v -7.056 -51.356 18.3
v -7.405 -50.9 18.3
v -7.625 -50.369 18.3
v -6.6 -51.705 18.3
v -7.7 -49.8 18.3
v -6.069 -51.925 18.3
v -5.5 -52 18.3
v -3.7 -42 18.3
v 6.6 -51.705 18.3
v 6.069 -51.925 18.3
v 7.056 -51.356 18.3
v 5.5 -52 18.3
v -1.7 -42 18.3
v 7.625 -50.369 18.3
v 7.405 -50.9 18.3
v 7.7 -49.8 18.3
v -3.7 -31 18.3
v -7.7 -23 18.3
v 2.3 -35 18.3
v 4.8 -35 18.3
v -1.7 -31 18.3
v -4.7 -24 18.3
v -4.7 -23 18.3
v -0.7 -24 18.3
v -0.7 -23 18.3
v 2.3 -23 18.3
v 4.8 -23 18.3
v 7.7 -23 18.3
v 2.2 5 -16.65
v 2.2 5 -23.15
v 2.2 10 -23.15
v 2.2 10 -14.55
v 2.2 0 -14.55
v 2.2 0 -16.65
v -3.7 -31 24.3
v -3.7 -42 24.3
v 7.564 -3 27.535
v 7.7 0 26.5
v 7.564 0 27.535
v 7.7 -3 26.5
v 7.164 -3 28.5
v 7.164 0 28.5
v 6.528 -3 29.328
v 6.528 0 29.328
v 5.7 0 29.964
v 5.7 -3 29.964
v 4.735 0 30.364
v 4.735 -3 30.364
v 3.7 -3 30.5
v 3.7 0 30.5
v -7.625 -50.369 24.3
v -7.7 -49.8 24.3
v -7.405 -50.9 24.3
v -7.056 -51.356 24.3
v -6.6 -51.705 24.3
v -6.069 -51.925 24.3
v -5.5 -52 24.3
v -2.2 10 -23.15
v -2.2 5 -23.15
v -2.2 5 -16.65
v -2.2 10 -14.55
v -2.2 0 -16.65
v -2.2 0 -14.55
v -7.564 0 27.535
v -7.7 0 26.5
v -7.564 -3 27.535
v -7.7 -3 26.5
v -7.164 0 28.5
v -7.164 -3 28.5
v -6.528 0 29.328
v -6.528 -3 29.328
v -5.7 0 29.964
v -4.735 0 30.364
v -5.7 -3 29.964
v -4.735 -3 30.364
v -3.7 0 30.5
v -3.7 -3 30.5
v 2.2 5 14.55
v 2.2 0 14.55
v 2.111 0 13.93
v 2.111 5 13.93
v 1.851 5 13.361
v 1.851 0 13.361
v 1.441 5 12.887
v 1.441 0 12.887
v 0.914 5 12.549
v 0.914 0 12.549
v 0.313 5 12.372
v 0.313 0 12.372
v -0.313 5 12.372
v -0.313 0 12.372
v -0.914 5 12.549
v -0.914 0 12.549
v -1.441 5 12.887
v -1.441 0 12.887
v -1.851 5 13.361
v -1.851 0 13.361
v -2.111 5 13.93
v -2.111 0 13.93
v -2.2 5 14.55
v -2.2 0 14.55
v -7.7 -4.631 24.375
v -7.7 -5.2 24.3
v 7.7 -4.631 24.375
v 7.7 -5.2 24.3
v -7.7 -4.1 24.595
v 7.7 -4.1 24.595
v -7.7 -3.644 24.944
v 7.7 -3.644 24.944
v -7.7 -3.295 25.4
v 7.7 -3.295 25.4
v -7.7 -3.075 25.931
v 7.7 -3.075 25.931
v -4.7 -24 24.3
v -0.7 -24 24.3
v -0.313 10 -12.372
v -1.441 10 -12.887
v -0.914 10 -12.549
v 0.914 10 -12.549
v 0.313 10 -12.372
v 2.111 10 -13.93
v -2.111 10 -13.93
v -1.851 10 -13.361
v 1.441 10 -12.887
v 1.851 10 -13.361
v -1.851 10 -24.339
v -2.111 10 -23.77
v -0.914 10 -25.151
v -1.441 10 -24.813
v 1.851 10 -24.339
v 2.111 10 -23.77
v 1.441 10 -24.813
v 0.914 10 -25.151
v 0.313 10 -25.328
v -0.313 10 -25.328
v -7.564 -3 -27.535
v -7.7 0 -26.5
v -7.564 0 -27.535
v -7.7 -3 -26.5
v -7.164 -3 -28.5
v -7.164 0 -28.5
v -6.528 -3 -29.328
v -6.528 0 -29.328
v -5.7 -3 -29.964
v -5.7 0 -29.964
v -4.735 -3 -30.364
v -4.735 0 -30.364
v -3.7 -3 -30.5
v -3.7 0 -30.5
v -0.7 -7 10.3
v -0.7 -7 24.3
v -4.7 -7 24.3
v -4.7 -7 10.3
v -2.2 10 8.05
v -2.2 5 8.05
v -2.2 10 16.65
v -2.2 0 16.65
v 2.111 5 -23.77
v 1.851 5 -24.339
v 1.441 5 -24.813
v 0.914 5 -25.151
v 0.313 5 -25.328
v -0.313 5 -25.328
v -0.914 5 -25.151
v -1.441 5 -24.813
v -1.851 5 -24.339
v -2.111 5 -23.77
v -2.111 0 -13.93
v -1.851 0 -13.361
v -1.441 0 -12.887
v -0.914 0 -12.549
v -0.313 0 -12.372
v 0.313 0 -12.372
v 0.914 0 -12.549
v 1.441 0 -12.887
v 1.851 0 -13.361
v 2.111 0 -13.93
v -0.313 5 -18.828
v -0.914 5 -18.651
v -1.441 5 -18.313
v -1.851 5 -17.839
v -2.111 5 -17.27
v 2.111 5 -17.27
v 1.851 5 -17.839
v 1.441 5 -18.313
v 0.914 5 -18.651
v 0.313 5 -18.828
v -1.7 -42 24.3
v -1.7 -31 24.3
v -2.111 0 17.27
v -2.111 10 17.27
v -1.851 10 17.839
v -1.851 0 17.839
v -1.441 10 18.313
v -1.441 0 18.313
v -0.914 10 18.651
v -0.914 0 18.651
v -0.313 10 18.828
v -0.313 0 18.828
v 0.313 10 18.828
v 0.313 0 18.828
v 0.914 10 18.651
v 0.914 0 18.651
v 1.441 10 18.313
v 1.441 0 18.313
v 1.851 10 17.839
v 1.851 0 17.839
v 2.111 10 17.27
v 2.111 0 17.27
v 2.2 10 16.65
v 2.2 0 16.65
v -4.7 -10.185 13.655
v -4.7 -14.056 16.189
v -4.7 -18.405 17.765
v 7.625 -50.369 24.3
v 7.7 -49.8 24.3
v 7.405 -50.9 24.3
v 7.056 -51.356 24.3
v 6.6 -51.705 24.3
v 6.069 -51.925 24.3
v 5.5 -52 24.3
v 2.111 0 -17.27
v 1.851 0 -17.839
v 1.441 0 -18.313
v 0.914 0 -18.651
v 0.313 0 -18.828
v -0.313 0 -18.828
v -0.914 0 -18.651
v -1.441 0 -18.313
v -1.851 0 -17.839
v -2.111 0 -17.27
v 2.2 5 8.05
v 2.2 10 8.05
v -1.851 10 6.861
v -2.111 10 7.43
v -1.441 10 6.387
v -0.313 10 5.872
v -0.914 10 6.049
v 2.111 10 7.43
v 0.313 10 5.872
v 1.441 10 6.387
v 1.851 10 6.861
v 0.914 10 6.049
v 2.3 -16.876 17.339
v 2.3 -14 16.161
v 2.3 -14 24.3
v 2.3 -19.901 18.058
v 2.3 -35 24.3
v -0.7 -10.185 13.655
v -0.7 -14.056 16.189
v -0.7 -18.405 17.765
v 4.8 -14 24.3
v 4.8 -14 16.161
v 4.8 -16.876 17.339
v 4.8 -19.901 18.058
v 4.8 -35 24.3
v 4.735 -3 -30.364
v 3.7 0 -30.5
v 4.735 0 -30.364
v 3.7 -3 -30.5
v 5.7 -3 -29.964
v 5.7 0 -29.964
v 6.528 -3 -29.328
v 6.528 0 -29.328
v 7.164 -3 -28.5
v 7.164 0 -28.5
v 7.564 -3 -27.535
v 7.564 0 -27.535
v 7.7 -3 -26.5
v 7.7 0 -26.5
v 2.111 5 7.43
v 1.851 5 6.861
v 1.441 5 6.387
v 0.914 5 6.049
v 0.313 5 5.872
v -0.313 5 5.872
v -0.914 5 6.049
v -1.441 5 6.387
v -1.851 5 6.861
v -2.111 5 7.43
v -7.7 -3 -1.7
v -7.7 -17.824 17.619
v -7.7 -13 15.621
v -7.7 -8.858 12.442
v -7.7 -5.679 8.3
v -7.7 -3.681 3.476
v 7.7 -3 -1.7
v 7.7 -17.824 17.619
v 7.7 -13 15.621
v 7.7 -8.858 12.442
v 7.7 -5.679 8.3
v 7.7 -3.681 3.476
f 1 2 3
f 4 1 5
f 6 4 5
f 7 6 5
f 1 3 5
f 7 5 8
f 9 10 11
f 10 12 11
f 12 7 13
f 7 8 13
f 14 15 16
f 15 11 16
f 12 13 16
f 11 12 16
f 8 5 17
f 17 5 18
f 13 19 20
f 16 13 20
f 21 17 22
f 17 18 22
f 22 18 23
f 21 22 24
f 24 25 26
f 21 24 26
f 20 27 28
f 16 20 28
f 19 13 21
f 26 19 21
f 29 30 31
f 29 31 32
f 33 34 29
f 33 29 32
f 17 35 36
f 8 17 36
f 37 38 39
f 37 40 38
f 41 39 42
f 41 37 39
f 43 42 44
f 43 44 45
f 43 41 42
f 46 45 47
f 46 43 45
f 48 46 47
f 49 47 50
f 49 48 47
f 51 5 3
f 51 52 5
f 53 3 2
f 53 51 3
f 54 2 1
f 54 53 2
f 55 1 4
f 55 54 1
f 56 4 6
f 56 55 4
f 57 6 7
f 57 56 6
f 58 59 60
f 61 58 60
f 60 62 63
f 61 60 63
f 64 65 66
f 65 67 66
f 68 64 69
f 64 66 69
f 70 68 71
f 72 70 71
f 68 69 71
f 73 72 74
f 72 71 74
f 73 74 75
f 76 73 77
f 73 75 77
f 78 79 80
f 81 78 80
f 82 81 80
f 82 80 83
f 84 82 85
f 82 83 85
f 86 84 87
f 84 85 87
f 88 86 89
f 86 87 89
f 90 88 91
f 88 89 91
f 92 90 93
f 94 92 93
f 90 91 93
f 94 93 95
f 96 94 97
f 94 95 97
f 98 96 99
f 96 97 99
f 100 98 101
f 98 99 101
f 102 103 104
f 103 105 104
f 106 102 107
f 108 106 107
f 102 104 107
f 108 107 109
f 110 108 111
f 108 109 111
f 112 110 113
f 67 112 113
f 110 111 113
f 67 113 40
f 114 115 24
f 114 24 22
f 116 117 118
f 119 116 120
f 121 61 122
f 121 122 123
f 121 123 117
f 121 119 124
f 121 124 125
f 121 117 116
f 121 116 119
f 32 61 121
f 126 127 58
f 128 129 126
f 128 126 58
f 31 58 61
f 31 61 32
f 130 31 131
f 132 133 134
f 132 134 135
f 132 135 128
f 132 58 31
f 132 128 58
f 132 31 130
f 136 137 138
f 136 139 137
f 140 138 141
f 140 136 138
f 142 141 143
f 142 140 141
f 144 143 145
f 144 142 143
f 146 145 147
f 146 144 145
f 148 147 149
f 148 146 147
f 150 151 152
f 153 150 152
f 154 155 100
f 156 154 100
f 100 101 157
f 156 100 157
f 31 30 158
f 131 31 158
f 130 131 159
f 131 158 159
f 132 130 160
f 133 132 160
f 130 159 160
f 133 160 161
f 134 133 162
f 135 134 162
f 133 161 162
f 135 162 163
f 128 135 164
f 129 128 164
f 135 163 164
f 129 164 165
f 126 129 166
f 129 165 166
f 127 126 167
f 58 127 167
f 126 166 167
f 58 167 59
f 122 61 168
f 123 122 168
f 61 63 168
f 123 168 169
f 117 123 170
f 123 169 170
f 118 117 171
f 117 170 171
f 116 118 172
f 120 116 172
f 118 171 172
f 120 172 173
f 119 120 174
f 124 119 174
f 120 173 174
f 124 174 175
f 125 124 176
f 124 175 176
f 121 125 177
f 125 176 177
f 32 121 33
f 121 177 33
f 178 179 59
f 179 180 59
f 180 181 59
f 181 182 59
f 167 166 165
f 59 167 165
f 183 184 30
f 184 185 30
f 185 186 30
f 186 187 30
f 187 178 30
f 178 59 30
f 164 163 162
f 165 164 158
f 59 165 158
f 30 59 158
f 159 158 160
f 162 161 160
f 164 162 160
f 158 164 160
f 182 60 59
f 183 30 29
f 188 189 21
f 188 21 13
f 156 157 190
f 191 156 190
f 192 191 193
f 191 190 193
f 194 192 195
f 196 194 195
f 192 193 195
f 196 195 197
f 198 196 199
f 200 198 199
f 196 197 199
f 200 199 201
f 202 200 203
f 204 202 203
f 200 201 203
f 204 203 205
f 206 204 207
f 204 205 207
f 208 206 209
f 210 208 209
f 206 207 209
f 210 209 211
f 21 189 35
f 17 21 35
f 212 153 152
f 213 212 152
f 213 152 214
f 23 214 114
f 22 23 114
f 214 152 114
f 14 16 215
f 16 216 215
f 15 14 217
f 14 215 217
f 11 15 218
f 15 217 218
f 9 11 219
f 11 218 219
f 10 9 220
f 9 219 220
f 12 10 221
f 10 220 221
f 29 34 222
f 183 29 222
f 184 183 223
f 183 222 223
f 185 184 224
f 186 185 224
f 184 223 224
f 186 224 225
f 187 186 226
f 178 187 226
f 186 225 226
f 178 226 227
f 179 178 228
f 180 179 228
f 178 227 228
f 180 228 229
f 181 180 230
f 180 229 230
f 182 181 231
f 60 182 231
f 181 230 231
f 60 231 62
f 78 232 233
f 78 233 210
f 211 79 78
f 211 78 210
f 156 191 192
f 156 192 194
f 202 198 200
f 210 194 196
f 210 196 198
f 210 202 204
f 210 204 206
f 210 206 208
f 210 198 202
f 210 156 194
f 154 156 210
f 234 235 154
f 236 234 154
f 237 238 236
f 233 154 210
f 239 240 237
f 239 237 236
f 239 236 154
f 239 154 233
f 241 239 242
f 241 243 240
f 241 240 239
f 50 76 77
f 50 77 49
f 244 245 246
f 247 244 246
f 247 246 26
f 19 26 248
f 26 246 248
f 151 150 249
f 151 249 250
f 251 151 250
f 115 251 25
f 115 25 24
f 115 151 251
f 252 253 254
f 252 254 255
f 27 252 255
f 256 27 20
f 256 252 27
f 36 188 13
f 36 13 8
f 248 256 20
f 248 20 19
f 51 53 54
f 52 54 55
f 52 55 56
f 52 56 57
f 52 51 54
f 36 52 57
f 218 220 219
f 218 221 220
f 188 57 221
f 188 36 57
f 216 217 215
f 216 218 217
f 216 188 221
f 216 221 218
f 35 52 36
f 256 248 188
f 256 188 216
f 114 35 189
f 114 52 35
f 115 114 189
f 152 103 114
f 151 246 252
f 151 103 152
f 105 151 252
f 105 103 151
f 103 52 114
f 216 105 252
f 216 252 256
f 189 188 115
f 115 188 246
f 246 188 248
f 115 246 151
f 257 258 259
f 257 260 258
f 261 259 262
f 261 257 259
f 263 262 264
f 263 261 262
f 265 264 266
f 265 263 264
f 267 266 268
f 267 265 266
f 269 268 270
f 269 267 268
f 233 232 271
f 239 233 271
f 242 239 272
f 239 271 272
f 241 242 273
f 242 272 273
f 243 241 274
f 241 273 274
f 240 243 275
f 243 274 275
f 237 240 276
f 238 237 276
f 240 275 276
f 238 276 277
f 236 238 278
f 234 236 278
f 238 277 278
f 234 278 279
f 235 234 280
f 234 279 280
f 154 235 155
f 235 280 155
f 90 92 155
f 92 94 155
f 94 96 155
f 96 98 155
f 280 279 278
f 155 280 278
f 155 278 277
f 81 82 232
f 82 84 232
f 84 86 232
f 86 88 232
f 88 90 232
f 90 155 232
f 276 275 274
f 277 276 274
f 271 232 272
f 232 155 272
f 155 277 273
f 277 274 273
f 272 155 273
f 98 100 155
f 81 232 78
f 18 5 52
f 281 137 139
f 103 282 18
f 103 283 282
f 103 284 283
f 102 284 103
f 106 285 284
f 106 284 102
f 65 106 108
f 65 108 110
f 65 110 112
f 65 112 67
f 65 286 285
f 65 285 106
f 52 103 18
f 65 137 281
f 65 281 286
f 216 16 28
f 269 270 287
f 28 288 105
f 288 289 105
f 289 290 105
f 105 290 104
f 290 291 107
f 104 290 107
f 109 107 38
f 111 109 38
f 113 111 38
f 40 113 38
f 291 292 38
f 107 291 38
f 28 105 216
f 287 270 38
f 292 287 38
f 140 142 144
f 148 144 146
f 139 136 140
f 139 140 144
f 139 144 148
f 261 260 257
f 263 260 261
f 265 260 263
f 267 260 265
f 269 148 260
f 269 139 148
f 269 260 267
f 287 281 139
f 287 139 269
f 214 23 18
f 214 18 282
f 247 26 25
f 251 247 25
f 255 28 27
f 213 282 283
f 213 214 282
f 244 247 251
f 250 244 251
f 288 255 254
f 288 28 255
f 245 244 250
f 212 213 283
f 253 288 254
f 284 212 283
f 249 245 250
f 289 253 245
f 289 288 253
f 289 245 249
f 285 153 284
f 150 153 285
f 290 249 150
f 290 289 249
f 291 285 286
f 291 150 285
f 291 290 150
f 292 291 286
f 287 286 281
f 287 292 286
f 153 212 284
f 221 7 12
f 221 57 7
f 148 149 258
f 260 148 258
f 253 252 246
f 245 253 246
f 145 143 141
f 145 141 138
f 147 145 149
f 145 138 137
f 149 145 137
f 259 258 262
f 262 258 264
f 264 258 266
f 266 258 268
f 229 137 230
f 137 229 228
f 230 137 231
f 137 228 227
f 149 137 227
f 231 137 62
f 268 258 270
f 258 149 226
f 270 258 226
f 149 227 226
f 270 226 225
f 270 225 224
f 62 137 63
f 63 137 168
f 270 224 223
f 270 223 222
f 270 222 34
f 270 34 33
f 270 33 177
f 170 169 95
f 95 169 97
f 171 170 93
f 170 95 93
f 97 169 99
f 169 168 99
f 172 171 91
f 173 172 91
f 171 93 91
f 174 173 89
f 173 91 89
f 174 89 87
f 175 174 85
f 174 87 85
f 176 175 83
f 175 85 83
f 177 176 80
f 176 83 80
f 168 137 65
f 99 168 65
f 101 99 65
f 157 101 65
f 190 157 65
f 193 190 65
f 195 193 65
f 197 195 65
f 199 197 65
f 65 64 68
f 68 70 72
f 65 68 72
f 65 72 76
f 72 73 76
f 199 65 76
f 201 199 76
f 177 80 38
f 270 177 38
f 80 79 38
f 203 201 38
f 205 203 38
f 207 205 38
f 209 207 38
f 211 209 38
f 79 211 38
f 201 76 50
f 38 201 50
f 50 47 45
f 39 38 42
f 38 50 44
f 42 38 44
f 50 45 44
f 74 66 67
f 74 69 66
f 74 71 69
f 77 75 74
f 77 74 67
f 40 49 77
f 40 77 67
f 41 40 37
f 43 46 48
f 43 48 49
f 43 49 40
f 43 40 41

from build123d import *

# Parameters (mm, degrees)
SKETCH_W      = 15.4
SKETCH_H      = 61
PAD_DEPTH     = 3
FILLET_R      = 4
PAD001_DEPTH  = 5
PAD002_DEPTH  = 5
SKETCH003_W   = 15.4
SKETCH003_H   = 6
PAD003_DEPTH  = 49
FILLET001_R   = 2.2
FILLET002_R   = 20
FILLET003_R   = 2.2
SKETCH004_W   = 4
SKETCH004_H   = 17
SKETCH004_W_2 = 2
SKETCH004_H_2 = 11
SKETCH004_W_3 = 2.5
SKETCH004_H_3 = 21
POCKET_DEPTH  = 54.801


with BuildPart() as part:
    # Sketch → Pad (new body)
    with BuildSketch(Plane.XZ):
        Rectangle(SKETCH_W, SKETCH_H)
    extrude(amount=PAD_DEPTH)

    # Fillet
    fillet_edges = [part.edges().sort_by_distance(p)[0] for p in [
        (7.7, -1.5, 30.5),
        (-7.7, -1.5, 30.5),
        (7.7, -1.5, -30.5),
        (-7.7, -1.5, -30.5),
    ]]
    fillet(fillet_edges, radius=FILLET_R)

    # Sketch001 (on Face2 of Fillet) → Pad001 (join)
    with BuildSketch(Plane(origin=(0, 0, 0), x_dir=(1, 0, 0), z_dir=(0, 1, 0))):
        with BuildLine():
            Line((-2.2, 16.65), (-2.2, 14.55))
            ThreePointArc((-2.2, 14.55), (0, 12.35), (2.2, 14.55))
            Line((2.2, 16.65), (2.2, 14.55))
            ThreePointArc((2.2, 16.65), (0, 18.85), (-2.2, 16.65))
        make_face()
        with BuildLine():
            Line((-2.2, -14.55), (-2.2, -16.65))
            ThreePointArc((-2.2, -16.65), (0, -18.85), (2.2, -16.65))
            Line((2.2, -14.55), (2.2, -16.65))
            ThreePointArc((2.2, -14.55), (0, -12.35), (-2.2, -14.55))
        make_face()
    extrude(amount=PAD001_DEPTH)

    # Sketch002 (on Face19 of Pad001) → Pad002 (join)
    with BuildSketch(Plane(origin=(0, 5, 0), x_dir=(1, 0, 0), z_dir=(0, 1, 0))):
        with BuildLine():
            Line((-2.2, 23.15), (-2.2, 14.55))
            ThreePointArc((-2.2, 14.55), (0, 12.35), (2.2, 14.55))
            Line((2.2, 23.15), (2.2, 14.55))
            ThreePointArc((2.2, 23.15), (0, 25.35), (-2.2, 23.15))
        make_face()
        with BuildLine():
            Line((-2.2, -8.05), (-2.2, -16.65))
            ThreePointArc((-2.2, -16.65), (0, -18.85), (2.2, -16.65))
            Line((2.2, -8.05), (2.2, -16.65))
            ThreePointArc((2.2, -8.05), (0, -5.85), (-2.2, -8.05))
        make_face()
    extrude(amount=PAD002_DEPTH)

    # Sketch003 (on Face5 of Pad002) → Pad003 (join)
    with BuildSketch(Plane.XZ.offset(3)):
        with Locations((0, 21.3)):
            Rectangle(SKETCH003_W, SKETCH003_H)
    extrude(amount=PAD003_DEPTH)

    # Fillet001
    fillet001_edges = [part.edges().sort_by_distance(p)[0] for p in [
        (7.7, -52, 21.3),
        (-7.7, -52, 21.3),
    ]]
    fillet(fillet001_edges, radius=FILLET001_R)

    # Fillet002
    fillet002_edges = [part.edges().sort_by_distance(p)[0] for p in [
        (0, -3, 18.3),
    ]]
    fillet(fillet002_edges, radius=FILLET002_R)

    # Fillet003
    fillet003_edges = [part.edges().sort_by_distance(p)[0] for p in [
        (0, -3, 24.3),
    ]]
    fillet(fillet003_edges, radius=FILLET003_R)

    # Sketch004 (on Face2 of Fillet003) → Pocket (cut, through all)
    with BuildSketch(Plane(origin=(0, 0, 24.3), x_dir=(-1, 0, 0), z_dir=(0, 0, 1))):
        with Locations((2.7, 15.5)):
            Rectangle(SKETCH004_W, SKETCH004_H)
        with Locations((2.7, 36.5)):
            Rectangle(SKETCH004_W_2, SKETCH004_H_2)
        with Locations((-3.55, 24.5)):
            Rectangle(SKETCH004_W_3, SKETCH004_H_3)
    extrude(amount=-POCKET_DEPTH, mode=Mode.SUBTRACT)


solid = part.part
